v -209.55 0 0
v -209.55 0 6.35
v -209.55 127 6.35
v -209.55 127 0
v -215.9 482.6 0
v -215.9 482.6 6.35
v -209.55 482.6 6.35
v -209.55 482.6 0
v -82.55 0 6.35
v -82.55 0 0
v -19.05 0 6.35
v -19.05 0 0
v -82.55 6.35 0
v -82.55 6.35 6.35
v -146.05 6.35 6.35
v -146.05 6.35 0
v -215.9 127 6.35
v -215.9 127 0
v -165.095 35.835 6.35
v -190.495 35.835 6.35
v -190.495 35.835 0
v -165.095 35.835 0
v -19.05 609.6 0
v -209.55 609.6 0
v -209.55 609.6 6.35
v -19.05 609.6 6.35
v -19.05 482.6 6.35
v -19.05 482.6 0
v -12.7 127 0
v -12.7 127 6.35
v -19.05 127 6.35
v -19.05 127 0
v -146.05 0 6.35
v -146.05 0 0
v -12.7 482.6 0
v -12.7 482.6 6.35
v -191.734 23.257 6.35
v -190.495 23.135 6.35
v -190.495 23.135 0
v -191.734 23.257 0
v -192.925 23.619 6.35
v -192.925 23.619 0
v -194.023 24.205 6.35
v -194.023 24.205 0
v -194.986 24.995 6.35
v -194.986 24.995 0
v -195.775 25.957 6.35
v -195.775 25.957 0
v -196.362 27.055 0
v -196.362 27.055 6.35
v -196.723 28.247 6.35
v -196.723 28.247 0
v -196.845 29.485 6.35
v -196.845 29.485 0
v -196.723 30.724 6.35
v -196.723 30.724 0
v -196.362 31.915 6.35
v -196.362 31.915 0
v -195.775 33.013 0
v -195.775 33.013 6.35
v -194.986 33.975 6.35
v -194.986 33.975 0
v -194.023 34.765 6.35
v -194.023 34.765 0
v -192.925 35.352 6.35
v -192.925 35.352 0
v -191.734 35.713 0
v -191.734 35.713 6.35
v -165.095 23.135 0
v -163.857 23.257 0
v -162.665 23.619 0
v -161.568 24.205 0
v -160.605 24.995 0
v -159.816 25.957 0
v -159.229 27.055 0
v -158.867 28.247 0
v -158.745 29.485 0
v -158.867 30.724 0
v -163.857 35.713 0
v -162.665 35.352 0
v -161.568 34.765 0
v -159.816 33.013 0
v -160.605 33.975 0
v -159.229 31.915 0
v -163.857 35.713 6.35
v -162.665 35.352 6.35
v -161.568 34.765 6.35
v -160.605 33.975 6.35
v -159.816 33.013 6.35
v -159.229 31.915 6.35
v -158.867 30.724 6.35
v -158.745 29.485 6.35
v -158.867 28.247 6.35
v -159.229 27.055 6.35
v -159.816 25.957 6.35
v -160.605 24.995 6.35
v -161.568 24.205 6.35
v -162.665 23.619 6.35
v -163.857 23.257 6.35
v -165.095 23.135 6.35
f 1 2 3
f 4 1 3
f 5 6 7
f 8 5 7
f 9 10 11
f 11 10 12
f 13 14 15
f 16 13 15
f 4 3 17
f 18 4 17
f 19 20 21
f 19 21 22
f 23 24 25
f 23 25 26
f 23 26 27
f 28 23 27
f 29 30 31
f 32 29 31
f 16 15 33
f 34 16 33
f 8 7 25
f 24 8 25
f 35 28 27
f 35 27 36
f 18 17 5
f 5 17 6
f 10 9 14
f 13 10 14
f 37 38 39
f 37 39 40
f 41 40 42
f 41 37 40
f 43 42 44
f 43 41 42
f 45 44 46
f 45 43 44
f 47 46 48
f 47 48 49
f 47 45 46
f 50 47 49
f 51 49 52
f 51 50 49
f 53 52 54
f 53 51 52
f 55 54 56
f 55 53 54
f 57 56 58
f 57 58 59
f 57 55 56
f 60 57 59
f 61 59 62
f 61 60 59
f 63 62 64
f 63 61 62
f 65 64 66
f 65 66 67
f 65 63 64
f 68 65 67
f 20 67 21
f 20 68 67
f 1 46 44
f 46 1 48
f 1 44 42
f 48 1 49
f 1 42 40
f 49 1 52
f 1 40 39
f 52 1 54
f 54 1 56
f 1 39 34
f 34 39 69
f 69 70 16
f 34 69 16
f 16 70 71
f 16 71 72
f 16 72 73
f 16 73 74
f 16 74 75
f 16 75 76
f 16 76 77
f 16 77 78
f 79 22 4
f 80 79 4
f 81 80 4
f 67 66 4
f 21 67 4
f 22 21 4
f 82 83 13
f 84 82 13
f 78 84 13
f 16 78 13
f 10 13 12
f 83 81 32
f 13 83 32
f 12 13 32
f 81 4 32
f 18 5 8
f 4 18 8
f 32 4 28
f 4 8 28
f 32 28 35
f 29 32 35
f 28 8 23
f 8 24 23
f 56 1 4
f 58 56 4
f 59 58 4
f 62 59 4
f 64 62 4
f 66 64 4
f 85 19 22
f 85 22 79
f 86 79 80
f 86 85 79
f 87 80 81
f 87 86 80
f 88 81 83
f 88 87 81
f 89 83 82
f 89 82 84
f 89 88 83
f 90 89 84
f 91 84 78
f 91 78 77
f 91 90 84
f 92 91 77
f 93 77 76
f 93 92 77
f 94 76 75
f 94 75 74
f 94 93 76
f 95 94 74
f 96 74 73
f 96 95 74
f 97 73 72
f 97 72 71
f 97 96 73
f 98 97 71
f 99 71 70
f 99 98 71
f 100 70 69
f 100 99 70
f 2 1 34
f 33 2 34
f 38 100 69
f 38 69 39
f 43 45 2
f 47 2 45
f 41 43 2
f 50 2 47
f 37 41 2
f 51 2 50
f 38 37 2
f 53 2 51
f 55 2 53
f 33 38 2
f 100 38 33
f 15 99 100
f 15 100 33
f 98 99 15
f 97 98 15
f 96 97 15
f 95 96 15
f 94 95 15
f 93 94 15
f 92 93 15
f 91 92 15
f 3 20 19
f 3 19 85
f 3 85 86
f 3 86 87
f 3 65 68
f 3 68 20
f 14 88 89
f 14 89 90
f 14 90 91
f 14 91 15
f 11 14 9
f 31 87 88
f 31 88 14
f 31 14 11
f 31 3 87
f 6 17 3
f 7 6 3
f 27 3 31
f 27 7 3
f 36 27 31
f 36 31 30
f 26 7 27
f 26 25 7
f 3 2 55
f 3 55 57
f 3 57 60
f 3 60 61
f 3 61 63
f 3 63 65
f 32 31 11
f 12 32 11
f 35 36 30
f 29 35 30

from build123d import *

# Parameters (mm, degrees)
SKETCH1_W                = 228.6
SKETCH1_H                = 609.6
BOSS_EXTRUDE1_DEPTH      = 6.35
CUT_EXTRUDE1_DEPTH       = 6.35
CUT_EXTRUDE4_DEPTH       = 1
CUT_EXTRUDE4_DEPTH_BACK  = 7.35
CUT_EXTRUDE7_DEPTH       = 1
CUT_EXTRUDE7_DEPTH_BACK  = 7.35
CUT_EXTRUDE8_DEPTH       = 1
CUT_EXTRUDE8_DEPTH_BACK  = 7.35
CUT_EXTRUDE9_DEPTH       = 1
CUT_EXTRUDE9_DEPTH_BACK  = 7.35
CUT_EXTRUDE10_DEPTH      = 1
CUT_EXTRUDE10_DEPTH_BACK = 7.35
CUT_EXTRUDE11_DEPTH      = 1
CUT_EXTRUDE11_DEPTH_BACK = 7.35
CUT_EXTRUDE12_DEPTH      = 1
CUT_EXTRUDE12_DEPTH_BACK = 7.35


with BuildPart() as part:
    # Sketch1 → Boss-Extrude1 (new body)
    with BuildSketch(Plane.XY):
        with Locations((-114.3, 304.8)):
            Rectangle(SKETCH1_W, SKETCH1_H)
    extrude(amount=BOSS_EXTRUDE1_DEPTH)

    # Sketch2 → Cut-Extrude1 (cut)
    with BuildSketch(Plane.XY.offset(6.35)):
        with BuildLine():
            Line((-165.095373919, 23.135327723), (-190.495373919, 23.135327723))
            ThreePointArc((-190.495373919, 23.135327723), (-196.845373919, 29.485327723), (-190.495373919, 35.835327723))
            Line((-190.495373919, 35.835327723), (-165.095373919, 35.835327723))
            ThreePointArc((-165.095373919, 35.835327723), (-158.745373919, 29.485327723), (-165.095373919, 23.135327723))
        make_face()
    extrude(amount=-CUT_EXTRUDE1_DEPTH, mode=Mode.SUBTRACT)

    # Sketch6 → Cut-Extrude4 (cut, two sides)
    with BuildSketch(Plane.XY.offset(6.35)) as cut_extrude4_sk:
        Polygon((-19.05, -1299.222032855), (-19.05, 0), (-19.05, 127), (0, 127), (1299.222032855, 127), (3207.394059988, -1636.743484042), (1889.122027132, -3062.965516897), align=None)
    extrude(amount=CUT_EXTRUDE4_DEPTH, mode=Mode.SUBTRACT)
    extrude(cut_extrude4_sk.sketch, amount=-CUT_EXTRUDE4_DEPTH_BACK, mode=Mode.SUBTRACT)

    # Sketch5 → Cut-Extrude7 (cut, two sides)
    with BuildSketch(Plane.XY.offset(6.35)) as cut_extrude7_sk:
        Polygon((-19.05, 1908.822032855), (-19.05, 609.6), (-19.05, 482.6), (0, 482.6), (1299.222032855, 482.6), (3207.394059988, 2246.343484042), (1889.122027132, 3672.565516897), align=None)
    extrude(amount=CUT_EXTRUDE7_DEPTH, mode=Mode.SUBTRACT)
    extrude(cut_extrude7_sk.sketch, amount=-CUT_EXTRUDE7_DEPTH_BACK, mode=Mode.SUBTRACT)

    # Sketch11 → Cut-Extrude8 (cut, two sides)
    with BuildSketch(Plane.XY.offset(6.35)) as cut_extrude8_sk:
        Polygon((-12.7, 1549.984641462), (-12.7, 482.6), (-12.7, 127), (-12.7, -940.384641462), (2122.069282924, -940.384641462), (2122.069282924, 1549.984641462), align=None)
    extrude(amount=CUT_EXTRUDE8_DEPTH, mode=Mode.SUBTRACT)
    extrude(cut_extrude8_sk.sketch, amount=-CUT_EXTRUDE8_DEPTH_BACK, mode=Mode.SUBTRACT)

    # Sketch15 → Cut-Extrude9 (cut, two sides)
    with BuildSketch(Plane.XY.offset(6.35)) as cut_extrude9_sk:
        Polygon((-209.55, -1291.190200556), (-209.55, 0), (-209.55, 127), (-228.6, 127), (-1519.790200556, 127), (-3416.571079884, -1625.401447117), (-2106.330879328, -3043.591647673), align=None)
    extrude(amount=CUT_EXTRUDE9_DEPTH, mode=Mode.SUBTRACT)
    extrude(cut_extrude9_sk.sketch, amount=-CUT_EXTRUDE9_DEPTH_BACK, mode=Mode.SUBTRACT)

    # Sketch12 → Cut-Extrude10 (cut, two sides)
    with BuildSketch(Plane.XY.offset(6.35)) as cut_extrude10_sk:
        Polygon((-209.55, 1900.790200556), (-209.55, 609.6), (-209.55, 482.6), (-228.6, 482.6), (-1519.790200556, 482.6), (-3416.571079884, 2235.001447117), (-2106.330879328, 3653.191647673), align=None)
    extrude(amount=CUT_EXTRUDE10_DEPTH, mode=Mode.SUBTRACT)
    extrude(cut_extrude10_sk.sketch, amount=-CUT_EXTRUDE10_DEPTH_BACK, mode=Mode.SUBTRACT)

    # Sketch16 → Cut-Extrude11 (cut, two sides)
    with BuildSketch(Plane.XY.offset(6.35)) as cut_extrude11_sk:
        Polygon((-215.9, 1539.868828907), (-215.9, 482.6), (-215.9, 127), (-215.9, -930.268828907), (-2330.437657814, -930.268828907), (-2330.437657814, 1539.868828907), align=None)
    extrude(amount=CUT_EXTRUDE11_DEPTH, mode=Mode.SUBTRACT)
    extrude(cut_extrude11_sk.sketch, amount=-CUT_EXTRUDE11_DEPTH_BACK, mode=Mode.SUBTRACT)

    # Sketch18 → Cut-Extrude12 (cut, two sides)
    with BuildSketch(Plane.XY.offset(6.35)) as cut_extrude12_sk:
        Polygon((-82.55, -1258.029458787), (-82.55, 0), (-82.55, 6.35), (-146.05, 6.35), (-146.05, 0), (-146.05, -1258.029458787), (-146.05, -3774.088376361), (-82.55, -3774.088376361), align=None)
    extrude(amount=CUT_EXTRUDE12_DEPTH, mode=Mode.SUBTRACT)
    extrude(cut_extrude12_sk.sketch, amount=-CUT_EXTRUDE12_DEPTH_BACK, mode=Mode.SUBTRACT)


solid = part.part
